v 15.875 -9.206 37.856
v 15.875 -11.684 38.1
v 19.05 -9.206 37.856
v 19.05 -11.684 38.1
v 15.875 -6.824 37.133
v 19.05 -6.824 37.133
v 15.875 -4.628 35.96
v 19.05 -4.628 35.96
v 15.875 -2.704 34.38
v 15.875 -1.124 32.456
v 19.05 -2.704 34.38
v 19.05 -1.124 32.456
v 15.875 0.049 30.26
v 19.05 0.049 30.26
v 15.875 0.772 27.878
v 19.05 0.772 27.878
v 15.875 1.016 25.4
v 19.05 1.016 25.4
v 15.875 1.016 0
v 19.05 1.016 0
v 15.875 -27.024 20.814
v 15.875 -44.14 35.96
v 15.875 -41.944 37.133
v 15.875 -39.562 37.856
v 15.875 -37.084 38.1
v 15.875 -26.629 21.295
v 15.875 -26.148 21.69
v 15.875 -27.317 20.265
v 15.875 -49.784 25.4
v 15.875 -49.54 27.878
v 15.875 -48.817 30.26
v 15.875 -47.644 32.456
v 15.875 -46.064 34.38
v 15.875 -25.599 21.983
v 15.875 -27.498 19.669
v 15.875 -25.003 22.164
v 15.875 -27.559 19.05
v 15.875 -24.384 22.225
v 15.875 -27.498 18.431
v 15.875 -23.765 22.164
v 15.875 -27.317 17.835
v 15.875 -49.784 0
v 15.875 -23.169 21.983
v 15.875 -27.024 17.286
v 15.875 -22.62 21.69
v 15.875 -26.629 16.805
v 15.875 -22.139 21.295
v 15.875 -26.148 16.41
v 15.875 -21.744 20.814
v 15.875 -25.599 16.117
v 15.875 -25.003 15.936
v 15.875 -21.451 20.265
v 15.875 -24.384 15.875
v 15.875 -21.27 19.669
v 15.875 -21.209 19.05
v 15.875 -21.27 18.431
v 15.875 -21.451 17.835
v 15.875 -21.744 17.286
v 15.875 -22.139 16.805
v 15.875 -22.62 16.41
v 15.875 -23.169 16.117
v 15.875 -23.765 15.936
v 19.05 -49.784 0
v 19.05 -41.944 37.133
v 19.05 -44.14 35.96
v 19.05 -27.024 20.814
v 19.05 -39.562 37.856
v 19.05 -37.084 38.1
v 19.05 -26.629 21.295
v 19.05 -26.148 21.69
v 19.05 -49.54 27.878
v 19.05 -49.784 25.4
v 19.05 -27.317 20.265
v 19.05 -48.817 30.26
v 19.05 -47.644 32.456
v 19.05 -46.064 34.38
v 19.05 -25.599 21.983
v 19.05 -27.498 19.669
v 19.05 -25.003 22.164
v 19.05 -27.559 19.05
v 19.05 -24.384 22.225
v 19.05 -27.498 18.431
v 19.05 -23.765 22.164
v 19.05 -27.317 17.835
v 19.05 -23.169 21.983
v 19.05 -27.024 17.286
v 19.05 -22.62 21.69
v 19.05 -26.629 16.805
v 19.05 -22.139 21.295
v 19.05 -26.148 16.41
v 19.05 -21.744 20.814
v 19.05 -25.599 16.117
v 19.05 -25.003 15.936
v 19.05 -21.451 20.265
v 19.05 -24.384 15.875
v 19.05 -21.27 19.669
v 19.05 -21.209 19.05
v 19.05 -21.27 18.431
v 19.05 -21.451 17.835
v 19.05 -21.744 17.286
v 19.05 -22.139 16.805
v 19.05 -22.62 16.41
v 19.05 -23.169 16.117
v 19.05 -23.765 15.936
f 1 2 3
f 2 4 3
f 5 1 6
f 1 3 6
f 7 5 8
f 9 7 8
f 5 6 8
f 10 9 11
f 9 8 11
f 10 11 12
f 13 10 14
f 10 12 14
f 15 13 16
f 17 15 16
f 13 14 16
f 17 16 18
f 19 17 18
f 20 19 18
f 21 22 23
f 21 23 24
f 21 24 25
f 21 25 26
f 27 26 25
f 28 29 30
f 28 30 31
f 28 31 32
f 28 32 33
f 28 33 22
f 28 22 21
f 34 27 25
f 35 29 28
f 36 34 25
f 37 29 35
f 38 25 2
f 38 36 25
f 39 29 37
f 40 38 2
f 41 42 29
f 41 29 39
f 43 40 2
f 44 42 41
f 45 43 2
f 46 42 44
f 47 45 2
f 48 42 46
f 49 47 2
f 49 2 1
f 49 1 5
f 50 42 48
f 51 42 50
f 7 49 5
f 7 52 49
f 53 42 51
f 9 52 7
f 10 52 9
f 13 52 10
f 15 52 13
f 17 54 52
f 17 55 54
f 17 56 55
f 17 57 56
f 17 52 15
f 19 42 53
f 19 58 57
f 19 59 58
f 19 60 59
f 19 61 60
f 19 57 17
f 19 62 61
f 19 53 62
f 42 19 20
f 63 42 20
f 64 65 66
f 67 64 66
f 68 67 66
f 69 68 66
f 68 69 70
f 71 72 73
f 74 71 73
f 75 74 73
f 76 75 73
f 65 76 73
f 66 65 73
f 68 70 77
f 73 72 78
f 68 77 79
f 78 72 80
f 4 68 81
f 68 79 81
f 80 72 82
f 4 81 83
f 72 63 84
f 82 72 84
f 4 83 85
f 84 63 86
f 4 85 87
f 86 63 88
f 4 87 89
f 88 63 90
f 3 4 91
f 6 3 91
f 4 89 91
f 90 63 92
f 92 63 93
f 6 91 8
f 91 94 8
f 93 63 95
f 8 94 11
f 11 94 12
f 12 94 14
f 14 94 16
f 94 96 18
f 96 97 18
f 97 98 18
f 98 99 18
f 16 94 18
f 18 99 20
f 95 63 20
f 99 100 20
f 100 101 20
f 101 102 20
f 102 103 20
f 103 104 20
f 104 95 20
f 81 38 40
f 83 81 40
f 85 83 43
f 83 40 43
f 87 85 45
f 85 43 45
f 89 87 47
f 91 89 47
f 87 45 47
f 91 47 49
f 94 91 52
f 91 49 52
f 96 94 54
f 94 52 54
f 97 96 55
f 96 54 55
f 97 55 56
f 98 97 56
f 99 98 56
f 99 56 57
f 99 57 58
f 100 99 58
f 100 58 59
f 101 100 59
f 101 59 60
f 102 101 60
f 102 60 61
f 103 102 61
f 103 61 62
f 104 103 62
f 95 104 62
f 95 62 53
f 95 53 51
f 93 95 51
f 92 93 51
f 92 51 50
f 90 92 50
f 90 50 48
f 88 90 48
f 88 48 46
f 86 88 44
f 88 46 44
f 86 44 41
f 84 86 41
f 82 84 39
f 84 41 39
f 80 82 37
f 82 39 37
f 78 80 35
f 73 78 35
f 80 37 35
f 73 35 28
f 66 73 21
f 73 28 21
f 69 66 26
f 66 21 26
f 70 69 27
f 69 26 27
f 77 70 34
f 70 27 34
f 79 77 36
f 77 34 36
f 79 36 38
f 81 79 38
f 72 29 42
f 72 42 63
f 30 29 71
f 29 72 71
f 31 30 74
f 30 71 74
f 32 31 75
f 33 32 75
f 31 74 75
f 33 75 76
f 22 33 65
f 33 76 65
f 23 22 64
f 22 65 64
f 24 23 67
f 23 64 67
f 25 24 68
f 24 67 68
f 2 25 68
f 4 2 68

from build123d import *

# Parameters (mm, degrees)
SKETCH1_W           = 3.175
SKETCH1_H           = 50.8
BOSS_EXTRUDE1_DEPTH = 38.1
SKETCH3_R           = 3.175
CUT_EXTRUDE1_DEPTH  = 38.1
FILLET1_R           = 12.7


with BuildPart() as part:
    # Sketch1 → Boss-Extrude1 (new body)
    with BuildSketch(Plane.XY):
        with Locations((17.4625, -24.384)):
            Rectangle(SKETCH1_W, SKETCH1_H)
    extrude(amount=BOSS_EXTRUDE1_DEPTH)

    # Sketch3 → Cut-Extrude1 (cut)
    with BuildSketch(Plane.ZY.offset(-15.875)):
        with Locations((19.05, -24.384)):
            Circle(SKETCH3_R)
    extrude(amount=-CUT_EXTRUDE1_DEPTH, mode=Mode.SUBTRACT)

    # Fillet1
    fillet1_edges = [part.edges().sort_by_distance(p)[0] for p in [
        (17.4625, -49.784, 38.1),
        (17.4625, 1.016, 38.1),
    ]]
    fillet(fillet1_edges, radius=FILLET1_R)


solid = part.part
